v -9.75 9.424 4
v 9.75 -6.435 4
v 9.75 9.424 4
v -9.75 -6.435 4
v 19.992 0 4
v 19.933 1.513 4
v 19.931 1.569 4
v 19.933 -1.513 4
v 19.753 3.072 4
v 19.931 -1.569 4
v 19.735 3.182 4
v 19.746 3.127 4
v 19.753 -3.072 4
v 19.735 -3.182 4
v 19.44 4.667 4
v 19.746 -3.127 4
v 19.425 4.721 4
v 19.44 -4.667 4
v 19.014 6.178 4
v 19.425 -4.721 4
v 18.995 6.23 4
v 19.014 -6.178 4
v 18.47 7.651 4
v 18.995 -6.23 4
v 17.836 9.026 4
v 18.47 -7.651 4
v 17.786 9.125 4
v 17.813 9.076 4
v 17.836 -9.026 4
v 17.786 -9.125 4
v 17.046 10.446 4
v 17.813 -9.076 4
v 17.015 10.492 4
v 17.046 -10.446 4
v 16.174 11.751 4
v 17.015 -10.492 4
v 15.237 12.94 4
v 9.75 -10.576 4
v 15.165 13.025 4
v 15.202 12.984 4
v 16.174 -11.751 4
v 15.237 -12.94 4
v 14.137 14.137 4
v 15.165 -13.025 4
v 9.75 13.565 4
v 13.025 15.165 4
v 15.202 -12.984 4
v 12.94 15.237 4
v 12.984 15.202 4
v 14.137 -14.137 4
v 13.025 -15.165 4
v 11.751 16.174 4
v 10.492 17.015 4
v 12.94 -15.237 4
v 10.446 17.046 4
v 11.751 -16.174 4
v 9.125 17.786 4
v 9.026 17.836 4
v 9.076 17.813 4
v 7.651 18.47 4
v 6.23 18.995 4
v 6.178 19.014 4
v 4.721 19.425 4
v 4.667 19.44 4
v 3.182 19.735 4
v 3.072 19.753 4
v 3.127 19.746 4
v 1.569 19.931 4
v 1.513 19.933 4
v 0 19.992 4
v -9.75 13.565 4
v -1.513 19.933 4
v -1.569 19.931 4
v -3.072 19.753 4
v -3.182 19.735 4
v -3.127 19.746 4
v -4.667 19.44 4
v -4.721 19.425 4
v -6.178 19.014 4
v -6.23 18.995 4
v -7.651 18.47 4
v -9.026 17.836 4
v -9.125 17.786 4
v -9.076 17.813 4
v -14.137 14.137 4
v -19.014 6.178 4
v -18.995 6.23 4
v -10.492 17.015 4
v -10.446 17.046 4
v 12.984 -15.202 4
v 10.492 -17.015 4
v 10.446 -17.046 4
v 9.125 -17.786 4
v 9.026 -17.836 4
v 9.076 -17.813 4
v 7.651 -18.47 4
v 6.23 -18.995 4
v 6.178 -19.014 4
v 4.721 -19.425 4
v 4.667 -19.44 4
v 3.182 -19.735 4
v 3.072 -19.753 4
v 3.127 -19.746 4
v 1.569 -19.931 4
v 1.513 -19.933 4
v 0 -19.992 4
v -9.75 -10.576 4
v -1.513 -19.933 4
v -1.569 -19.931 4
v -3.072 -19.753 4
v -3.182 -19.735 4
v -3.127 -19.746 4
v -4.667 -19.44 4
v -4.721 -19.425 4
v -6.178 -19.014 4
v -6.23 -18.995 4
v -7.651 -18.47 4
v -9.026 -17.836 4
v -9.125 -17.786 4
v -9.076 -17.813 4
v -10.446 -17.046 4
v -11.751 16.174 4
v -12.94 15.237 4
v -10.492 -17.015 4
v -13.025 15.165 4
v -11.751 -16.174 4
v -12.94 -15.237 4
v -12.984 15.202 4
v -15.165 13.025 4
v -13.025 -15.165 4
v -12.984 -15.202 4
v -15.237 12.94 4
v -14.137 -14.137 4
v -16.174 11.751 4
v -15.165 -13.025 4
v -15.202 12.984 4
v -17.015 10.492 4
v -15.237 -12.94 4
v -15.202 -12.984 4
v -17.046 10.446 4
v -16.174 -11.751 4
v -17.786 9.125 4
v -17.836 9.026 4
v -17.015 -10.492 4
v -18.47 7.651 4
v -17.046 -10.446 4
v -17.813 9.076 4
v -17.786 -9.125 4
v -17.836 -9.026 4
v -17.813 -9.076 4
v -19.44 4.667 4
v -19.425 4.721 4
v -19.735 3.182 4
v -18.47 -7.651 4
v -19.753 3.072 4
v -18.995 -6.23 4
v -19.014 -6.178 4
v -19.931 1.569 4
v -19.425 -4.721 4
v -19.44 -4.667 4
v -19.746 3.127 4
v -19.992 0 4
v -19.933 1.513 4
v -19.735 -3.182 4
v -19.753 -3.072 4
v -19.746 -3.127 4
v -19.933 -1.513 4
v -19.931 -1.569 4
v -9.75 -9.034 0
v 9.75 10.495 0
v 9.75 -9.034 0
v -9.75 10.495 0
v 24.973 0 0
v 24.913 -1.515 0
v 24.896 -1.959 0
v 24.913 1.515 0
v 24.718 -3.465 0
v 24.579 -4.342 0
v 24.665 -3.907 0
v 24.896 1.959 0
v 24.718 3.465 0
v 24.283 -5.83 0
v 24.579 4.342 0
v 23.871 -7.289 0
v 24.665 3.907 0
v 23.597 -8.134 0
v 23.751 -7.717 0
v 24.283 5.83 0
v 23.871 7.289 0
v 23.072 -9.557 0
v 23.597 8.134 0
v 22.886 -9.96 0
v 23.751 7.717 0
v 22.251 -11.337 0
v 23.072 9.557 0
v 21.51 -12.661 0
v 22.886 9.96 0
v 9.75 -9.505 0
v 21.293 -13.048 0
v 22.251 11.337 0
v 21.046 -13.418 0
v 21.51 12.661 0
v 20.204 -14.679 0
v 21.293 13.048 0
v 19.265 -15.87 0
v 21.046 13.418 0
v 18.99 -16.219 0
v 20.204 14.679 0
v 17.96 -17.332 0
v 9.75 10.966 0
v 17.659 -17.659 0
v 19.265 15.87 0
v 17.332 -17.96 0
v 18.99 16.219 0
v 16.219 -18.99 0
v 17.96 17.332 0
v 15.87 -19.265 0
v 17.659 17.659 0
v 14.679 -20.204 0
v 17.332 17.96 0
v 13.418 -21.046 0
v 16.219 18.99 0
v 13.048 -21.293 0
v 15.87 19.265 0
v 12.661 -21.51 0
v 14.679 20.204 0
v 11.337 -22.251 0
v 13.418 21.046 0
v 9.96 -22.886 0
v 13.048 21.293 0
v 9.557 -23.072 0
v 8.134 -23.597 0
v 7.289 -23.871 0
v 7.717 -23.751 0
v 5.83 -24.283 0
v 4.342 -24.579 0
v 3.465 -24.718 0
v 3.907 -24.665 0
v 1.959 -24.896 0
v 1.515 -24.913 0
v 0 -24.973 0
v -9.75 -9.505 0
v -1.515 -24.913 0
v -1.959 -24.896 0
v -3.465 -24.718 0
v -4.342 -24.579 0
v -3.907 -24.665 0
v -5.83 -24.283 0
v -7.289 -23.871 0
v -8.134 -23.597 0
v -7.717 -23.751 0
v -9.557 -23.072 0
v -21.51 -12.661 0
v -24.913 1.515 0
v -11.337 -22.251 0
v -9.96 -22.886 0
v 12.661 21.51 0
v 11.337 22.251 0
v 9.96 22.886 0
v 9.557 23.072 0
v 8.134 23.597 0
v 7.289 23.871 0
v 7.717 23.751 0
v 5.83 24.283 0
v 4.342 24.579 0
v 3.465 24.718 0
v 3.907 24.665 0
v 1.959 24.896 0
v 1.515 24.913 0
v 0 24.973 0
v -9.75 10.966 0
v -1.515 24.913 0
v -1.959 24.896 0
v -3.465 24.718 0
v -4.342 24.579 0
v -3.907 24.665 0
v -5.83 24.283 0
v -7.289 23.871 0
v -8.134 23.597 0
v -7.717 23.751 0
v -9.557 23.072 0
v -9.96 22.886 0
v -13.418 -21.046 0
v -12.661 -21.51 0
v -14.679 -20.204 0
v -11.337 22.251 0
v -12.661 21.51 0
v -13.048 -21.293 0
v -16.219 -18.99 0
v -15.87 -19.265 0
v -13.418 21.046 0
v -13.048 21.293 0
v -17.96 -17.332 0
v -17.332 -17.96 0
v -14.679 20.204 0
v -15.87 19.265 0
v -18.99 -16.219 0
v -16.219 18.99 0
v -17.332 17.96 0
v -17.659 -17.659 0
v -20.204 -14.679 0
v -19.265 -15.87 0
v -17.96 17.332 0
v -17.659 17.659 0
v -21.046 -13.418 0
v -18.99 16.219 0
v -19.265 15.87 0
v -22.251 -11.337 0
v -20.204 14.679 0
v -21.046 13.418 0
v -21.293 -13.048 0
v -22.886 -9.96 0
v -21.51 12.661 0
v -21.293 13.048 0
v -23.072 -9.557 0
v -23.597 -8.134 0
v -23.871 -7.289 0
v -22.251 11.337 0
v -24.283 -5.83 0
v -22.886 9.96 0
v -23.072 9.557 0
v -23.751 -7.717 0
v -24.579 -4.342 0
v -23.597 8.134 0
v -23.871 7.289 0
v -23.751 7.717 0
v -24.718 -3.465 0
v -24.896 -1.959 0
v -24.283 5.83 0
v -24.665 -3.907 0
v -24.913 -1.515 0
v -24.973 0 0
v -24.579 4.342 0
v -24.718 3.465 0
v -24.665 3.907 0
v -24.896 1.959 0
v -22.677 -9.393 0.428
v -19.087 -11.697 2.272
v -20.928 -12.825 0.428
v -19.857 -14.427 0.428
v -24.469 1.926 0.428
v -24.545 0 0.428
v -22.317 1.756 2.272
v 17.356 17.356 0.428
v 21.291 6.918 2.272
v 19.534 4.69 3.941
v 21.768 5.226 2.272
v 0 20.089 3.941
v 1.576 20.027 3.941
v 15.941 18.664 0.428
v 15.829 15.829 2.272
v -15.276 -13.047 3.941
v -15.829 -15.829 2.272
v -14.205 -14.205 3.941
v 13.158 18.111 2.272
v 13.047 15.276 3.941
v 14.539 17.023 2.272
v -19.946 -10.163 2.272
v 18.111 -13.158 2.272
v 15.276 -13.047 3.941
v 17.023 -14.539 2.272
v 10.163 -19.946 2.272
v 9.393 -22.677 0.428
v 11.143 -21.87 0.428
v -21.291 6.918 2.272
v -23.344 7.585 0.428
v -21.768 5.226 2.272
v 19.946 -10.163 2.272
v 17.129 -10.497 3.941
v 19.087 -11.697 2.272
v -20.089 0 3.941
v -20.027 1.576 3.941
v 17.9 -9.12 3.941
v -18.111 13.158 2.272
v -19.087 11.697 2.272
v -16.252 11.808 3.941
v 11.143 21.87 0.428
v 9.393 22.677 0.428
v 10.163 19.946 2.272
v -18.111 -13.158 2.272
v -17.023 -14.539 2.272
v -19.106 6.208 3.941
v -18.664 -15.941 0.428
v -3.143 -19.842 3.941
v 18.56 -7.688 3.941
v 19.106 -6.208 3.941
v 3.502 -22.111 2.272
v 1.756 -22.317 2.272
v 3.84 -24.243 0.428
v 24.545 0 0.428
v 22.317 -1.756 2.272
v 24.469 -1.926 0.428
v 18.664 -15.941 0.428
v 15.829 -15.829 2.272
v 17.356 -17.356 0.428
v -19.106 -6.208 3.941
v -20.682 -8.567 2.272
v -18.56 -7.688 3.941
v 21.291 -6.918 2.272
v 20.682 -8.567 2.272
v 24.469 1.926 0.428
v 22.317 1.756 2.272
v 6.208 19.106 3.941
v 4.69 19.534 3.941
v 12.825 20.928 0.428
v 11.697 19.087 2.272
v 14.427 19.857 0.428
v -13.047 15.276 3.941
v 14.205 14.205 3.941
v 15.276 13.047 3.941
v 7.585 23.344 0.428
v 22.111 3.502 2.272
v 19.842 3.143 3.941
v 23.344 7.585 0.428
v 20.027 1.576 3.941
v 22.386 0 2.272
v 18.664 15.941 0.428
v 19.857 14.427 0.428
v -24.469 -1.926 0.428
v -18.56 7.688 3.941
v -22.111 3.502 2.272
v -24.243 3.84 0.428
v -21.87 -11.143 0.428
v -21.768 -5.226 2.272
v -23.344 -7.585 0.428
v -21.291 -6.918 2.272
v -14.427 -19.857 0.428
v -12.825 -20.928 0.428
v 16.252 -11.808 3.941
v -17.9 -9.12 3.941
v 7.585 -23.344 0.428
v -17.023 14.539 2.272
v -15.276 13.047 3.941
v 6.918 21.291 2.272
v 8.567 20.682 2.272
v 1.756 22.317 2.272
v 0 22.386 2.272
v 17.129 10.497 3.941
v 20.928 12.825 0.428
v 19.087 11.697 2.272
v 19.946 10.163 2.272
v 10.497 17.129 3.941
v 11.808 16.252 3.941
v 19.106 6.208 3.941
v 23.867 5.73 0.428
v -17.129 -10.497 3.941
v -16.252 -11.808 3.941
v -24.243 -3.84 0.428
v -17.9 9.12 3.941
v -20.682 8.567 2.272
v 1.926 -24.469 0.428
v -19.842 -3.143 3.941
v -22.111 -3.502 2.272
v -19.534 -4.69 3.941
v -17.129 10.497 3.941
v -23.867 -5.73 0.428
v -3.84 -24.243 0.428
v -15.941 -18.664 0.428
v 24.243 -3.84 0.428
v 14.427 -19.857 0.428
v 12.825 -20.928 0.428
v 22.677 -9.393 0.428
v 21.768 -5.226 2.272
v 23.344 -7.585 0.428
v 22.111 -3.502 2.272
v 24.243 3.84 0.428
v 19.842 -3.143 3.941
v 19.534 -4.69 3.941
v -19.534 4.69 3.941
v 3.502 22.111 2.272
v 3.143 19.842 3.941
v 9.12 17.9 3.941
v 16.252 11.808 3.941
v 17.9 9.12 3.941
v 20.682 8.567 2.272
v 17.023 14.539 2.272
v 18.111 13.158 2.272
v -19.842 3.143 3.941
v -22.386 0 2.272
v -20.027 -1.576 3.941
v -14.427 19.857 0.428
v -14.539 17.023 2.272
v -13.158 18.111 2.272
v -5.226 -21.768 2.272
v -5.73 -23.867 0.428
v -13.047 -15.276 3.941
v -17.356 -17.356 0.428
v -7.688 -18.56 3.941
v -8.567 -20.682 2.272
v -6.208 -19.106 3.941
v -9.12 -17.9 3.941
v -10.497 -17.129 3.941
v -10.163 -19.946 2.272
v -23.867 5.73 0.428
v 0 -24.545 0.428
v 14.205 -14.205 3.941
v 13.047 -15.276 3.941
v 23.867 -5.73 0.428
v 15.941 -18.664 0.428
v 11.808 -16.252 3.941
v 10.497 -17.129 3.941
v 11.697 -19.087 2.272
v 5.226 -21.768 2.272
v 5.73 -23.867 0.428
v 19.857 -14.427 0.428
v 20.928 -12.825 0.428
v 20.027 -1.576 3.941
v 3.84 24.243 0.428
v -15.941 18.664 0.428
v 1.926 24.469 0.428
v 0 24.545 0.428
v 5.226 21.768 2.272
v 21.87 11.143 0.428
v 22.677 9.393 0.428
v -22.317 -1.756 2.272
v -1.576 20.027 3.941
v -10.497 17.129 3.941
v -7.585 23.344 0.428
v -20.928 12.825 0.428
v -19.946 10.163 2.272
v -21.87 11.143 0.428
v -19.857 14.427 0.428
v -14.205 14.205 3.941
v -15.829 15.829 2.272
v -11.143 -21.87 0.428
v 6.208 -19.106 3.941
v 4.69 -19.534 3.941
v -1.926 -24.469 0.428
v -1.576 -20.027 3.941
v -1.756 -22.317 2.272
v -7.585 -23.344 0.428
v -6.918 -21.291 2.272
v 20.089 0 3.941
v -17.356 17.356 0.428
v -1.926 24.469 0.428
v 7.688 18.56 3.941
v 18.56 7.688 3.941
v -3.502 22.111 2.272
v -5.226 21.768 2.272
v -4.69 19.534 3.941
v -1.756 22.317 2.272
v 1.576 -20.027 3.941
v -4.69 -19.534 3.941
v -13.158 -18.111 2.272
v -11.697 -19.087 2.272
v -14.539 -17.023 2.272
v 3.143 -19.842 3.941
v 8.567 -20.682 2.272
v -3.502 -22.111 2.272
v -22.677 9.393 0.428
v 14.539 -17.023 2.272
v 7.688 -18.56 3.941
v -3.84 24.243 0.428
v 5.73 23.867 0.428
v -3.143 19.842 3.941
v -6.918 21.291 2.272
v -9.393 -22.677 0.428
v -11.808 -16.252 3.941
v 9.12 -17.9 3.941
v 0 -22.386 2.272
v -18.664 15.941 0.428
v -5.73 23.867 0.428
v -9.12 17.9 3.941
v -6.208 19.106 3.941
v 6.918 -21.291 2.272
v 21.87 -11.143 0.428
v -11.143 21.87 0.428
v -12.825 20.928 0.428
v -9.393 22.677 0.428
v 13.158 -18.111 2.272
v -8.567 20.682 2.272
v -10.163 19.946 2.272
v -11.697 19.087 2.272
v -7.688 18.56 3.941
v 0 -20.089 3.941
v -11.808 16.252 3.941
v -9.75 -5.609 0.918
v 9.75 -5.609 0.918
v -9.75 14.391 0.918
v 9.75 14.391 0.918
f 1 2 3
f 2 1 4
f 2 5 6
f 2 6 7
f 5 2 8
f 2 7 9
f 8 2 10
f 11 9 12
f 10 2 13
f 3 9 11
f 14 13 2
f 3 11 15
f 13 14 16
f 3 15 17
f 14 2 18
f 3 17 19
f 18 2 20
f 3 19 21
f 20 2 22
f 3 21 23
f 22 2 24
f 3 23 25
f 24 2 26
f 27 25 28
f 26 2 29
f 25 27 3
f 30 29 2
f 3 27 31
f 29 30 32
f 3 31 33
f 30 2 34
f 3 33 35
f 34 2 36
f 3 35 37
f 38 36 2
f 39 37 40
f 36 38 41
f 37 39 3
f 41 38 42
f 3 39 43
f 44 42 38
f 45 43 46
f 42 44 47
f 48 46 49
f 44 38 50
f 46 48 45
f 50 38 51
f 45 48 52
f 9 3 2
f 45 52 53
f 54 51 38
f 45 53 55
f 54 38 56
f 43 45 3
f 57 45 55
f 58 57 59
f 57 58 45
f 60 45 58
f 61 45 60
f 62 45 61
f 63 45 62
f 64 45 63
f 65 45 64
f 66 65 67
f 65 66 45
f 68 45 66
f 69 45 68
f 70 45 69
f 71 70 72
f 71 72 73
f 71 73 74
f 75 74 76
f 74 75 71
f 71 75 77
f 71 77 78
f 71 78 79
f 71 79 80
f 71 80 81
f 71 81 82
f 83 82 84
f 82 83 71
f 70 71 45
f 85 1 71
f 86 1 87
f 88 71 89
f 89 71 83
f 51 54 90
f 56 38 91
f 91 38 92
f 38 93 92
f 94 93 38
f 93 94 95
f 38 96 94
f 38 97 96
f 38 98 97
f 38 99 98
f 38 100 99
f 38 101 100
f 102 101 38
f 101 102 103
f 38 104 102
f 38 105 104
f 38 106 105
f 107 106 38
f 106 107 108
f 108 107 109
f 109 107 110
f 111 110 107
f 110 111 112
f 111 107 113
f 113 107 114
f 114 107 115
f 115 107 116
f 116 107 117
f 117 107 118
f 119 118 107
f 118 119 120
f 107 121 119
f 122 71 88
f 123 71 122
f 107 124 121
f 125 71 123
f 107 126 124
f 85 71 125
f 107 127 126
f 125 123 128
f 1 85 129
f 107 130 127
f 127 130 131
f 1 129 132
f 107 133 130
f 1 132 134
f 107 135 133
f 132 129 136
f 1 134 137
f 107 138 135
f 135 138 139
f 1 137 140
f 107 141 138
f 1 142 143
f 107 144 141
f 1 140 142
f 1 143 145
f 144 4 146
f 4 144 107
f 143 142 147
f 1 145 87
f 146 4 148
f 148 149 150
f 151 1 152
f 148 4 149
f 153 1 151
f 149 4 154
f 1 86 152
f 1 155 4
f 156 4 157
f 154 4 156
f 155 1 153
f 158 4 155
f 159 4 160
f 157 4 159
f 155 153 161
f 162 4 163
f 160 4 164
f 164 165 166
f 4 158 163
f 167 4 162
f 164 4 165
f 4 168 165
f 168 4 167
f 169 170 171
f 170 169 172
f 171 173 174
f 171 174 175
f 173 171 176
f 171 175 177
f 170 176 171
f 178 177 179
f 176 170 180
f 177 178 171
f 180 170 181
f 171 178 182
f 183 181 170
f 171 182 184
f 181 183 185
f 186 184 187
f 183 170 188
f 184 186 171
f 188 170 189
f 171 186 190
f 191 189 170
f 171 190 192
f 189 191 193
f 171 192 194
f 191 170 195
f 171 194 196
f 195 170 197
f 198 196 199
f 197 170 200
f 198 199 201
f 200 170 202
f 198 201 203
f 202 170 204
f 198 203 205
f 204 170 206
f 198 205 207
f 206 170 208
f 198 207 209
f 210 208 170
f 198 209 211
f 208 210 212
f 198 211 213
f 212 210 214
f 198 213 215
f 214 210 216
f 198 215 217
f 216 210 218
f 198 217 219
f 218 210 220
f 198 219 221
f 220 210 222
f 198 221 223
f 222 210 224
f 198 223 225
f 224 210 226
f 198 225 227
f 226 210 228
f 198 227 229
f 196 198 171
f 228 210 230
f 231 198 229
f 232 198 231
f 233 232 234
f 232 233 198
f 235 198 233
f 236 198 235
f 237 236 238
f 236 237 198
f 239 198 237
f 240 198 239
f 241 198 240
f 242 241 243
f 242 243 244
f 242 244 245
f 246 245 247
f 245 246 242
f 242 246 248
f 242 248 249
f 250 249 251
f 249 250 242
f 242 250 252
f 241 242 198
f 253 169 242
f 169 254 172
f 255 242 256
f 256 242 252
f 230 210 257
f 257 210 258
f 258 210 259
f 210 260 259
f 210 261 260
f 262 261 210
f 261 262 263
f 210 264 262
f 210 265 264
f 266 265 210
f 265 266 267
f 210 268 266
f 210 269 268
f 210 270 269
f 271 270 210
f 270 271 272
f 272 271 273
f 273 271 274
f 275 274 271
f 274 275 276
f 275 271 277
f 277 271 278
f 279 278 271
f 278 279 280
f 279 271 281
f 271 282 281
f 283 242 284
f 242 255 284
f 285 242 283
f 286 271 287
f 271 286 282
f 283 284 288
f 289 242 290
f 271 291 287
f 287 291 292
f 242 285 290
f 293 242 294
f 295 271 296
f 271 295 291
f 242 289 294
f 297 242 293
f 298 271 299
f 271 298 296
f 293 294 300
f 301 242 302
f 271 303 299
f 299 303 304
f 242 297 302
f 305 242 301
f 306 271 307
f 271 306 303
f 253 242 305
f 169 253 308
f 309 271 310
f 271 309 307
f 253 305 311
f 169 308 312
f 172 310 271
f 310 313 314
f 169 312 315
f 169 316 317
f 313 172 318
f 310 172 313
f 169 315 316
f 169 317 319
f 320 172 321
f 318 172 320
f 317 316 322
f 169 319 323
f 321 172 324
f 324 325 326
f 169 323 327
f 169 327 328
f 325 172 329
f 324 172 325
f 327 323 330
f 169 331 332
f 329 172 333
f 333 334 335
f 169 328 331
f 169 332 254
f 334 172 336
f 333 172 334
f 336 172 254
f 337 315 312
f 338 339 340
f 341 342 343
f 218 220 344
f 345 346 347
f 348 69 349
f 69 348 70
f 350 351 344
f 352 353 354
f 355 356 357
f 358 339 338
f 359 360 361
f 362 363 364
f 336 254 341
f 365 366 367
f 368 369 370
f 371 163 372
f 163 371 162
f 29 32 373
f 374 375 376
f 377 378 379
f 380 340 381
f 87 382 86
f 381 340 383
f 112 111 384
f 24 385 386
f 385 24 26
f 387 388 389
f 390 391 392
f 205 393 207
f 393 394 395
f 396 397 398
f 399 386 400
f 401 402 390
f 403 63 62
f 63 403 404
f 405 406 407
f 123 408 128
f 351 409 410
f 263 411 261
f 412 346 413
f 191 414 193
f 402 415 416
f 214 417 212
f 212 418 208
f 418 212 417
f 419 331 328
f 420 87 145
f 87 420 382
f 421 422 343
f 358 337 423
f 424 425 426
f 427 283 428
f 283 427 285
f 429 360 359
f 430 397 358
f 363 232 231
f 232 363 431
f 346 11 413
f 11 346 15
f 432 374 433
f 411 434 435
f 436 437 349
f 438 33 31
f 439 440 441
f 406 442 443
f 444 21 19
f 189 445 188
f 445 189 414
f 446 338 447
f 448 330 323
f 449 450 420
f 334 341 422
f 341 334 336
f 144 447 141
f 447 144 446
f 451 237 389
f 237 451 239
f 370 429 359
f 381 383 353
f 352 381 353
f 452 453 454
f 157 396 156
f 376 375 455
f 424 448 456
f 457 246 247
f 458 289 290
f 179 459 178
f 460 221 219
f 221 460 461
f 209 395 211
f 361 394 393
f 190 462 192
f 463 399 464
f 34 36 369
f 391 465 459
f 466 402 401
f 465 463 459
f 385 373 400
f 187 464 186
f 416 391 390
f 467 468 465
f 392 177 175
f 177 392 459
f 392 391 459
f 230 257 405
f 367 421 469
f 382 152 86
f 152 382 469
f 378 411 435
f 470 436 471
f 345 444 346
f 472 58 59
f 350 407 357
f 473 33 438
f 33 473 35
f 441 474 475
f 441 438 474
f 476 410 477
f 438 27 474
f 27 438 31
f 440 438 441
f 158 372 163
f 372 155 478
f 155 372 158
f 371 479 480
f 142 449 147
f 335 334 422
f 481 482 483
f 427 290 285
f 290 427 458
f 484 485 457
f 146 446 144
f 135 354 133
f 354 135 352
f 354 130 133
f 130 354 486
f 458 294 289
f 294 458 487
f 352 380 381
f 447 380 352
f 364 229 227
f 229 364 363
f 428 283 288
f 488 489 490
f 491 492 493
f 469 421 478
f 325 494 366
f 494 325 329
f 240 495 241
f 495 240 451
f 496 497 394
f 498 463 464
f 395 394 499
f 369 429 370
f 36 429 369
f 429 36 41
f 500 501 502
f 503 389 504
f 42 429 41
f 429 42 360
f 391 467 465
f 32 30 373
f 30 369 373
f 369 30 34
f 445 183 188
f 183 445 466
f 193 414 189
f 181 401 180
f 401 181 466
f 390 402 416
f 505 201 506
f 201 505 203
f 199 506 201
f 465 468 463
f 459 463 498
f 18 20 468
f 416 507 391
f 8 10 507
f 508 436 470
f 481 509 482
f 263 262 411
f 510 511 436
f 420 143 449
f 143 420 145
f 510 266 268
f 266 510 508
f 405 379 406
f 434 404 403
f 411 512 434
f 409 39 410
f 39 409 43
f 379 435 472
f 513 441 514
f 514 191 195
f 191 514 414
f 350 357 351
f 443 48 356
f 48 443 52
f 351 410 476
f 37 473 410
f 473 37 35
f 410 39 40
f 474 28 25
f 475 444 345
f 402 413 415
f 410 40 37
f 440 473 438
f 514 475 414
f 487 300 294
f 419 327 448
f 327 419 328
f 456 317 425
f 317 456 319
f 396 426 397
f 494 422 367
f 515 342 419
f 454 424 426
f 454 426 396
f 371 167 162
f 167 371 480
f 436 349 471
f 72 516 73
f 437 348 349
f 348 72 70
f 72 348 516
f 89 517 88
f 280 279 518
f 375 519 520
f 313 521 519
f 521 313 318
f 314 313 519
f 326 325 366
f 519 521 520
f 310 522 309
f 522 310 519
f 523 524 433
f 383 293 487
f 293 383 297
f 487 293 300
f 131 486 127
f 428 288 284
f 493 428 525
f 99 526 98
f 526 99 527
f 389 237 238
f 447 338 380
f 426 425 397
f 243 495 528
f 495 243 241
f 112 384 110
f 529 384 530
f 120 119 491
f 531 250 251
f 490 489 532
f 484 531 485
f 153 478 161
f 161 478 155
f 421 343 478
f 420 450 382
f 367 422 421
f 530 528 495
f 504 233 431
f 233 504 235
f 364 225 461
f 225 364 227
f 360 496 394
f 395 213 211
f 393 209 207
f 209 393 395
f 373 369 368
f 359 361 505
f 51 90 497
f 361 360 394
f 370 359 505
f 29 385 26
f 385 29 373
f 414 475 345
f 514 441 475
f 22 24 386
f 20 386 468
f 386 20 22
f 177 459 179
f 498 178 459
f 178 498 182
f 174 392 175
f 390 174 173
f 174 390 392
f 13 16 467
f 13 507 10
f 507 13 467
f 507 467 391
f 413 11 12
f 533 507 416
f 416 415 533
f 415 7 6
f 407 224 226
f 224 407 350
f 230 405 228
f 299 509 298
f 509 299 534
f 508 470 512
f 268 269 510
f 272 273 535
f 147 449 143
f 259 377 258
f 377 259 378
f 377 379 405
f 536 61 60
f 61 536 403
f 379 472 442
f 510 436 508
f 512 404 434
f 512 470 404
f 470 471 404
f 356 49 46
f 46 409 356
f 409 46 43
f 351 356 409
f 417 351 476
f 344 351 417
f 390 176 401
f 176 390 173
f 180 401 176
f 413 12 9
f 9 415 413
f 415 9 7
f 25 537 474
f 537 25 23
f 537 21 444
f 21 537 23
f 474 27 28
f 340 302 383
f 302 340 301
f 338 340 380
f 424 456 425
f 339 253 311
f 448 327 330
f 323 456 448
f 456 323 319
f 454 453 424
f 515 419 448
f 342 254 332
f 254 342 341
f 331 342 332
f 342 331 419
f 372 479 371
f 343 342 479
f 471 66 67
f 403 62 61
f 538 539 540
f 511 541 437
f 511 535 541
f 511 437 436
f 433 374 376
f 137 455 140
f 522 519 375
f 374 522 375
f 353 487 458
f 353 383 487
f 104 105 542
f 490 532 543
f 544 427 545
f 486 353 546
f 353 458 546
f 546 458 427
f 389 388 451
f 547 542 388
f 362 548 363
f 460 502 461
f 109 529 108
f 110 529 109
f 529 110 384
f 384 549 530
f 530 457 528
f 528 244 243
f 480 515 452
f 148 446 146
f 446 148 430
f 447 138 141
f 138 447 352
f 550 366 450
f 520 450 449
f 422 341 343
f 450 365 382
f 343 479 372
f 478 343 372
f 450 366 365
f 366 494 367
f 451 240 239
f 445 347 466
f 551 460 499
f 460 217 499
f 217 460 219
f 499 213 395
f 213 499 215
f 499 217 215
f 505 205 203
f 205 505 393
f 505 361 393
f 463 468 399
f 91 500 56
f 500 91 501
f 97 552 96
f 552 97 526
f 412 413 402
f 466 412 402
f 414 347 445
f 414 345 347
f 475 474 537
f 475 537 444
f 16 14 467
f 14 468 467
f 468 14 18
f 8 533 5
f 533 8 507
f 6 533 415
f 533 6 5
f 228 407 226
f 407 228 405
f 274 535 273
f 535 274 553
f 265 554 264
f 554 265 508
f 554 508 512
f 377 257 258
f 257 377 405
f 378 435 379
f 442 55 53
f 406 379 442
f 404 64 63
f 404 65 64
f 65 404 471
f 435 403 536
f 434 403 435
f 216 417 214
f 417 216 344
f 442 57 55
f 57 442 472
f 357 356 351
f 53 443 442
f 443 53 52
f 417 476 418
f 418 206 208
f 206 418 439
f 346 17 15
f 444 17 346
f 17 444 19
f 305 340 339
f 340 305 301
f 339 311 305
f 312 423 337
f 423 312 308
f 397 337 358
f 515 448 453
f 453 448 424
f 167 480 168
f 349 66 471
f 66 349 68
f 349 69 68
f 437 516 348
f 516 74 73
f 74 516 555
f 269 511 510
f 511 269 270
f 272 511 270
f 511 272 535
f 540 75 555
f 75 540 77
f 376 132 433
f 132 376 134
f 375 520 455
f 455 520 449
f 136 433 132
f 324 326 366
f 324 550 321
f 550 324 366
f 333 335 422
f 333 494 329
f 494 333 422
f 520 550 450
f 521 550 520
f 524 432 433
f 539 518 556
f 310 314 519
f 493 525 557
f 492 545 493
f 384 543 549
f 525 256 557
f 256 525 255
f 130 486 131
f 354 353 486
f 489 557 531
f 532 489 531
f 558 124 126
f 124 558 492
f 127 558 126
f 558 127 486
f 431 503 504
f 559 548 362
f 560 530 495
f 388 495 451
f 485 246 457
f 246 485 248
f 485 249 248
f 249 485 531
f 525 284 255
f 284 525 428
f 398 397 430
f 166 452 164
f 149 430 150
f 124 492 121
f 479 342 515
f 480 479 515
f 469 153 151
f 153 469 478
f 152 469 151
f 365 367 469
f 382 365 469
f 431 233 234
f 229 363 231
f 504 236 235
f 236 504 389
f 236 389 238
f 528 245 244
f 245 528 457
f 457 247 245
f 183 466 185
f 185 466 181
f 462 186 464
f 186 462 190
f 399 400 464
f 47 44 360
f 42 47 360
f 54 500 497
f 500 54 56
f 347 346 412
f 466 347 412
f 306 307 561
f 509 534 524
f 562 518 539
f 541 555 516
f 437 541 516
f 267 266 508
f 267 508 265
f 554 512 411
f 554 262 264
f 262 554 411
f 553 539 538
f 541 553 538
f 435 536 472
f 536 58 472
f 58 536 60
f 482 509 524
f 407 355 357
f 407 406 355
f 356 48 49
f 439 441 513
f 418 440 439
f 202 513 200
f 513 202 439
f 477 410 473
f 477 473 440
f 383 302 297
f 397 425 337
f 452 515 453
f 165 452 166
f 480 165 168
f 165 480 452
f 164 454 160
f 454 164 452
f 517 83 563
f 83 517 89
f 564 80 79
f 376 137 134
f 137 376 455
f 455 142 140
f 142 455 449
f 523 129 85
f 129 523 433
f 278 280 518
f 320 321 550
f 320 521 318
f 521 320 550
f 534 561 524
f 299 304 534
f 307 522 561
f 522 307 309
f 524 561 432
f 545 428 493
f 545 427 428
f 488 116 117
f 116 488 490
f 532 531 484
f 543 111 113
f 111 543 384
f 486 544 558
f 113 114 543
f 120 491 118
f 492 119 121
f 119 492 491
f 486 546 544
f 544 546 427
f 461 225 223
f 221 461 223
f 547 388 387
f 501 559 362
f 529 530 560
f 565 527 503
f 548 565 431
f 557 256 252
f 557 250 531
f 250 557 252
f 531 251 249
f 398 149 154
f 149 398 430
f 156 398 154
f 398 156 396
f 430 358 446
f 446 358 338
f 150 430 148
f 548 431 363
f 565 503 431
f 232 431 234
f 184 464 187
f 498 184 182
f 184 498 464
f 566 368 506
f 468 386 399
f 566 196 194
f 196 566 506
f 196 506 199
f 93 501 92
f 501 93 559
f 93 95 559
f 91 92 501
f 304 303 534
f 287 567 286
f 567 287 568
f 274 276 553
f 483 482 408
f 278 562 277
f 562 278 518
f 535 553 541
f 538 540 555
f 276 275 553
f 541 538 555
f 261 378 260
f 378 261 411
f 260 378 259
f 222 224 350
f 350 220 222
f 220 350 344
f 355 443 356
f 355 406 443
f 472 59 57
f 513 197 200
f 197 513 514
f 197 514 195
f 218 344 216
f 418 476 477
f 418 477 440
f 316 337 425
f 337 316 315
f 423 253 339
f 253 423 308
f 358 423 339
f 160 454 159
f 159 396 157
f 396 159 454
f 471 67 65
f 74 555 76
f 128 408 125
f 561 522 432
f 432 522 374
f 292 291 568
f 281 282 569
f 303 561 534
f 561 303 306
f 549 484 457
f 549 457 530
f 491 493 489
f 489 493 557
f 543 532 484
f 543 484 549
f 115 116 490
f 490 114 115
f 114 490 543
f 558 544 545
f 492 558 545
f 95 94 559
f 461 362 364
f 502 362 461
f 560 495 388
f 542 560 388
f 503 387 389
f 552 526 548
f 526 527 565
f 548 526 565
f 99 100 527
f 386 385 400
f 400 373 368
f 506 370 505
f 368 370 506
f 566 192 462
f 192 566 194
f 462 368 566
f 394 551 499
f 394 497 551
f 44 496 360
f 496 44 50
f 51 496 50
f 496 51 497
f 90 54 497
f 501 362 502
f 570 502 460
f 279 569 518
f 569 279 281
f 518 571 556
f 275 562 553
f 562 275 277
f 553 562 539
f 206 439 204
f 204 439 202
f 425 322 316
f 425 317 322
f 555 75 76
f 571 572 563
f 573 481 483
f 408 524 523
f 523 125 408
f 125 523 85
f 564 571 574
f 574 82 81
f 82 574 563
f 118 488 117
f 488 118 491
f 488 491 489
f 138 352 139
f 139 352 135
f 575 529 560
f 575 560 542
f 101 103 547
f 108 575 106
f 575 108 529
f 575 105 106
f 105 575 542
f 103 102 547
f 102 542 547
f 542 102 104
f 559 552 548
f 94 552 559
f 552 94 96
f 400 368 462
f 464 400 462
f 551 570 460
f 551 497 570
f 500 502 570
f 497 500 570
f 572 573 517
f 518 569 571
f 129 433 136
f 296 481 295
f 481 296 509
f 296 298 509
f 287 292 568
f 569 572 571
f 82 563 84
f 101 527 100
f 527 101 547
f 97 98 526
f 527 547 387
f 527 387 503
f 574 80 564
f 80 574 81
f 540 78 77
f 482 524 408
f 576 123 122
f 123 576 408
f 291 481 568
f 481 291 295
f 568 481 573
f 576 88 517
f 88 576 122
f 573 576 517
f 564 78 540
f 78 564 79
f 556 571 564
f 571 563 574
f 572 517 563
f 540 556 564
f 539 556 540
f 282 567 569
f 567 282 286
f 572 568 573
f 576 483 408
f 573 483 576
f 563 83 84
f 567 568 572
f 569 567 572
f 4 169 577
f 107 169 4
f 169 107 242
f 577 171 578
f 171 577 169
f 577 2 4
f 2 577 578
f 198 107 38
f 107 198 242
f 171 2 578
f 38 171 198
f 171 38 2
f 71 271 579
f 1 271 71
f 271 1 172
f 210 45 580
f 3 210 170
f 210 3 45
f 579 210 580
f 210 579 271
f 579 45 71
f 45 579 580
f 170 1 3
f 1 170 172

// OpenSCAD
$fn=80;

// Diameter of the base. 
base_diameter = 50; // [10:200]

// Taper ratio of the base. 0.0 means fully rounded top, 1.0 means straight up.
base_taper = 0.8; // [0.0:0.05:1.0]

// Height of the base
base_height = 4; // [1:0.5:10]

// Width of the tile.
tile_width = 19; // [4:.05:60]

// Thickness of the tile.
tile_tickness = 3.5; // [.25:.05:10]

// Clearance around the tile. Use this when you intend to wrap the tile with a piece of paper.
tile_clearance = 0.25; // [0.0:0.01:1]

// Tile placement
tile_placement = "back to back"; // [single, side by side, back to back]

// Angle at which the tile is tilted.
tile_tilt = 15; // [0:45]

// Vertial offset for tile (from bottom.)
tile_v_offset = 0.4; // [0:0.1:4]

tile_h_offset = sin(tile_tilt) * tile_width * .5;

r_bot = base_diameter / 2;
r_top = (base_diameter * base_taper) / 2;
z_offset = (r_bot * r_bot - 
            r_top * r_top - 
            base_height * base_height) / (2 * base_height);
sphere_radius = sqrt(r_bot * r_bot + z_offset * z_offset);

module tile() {
    translate([0, 0, 500])
    cube([tile_width + tile_clearance * 2, 
          tile_tickness  + tile_clearance * 2, 
          1000], center=true);
}


difference() {
    intersection() { 
        translate([0, 0, base_height/2])
        cylinder(r=r_bot, h=base_height, center=true);

        translate([0,0,-z_offset])
        sphere(r=sphere_radius);
    };
    
    translate([0, 0, tile_v_offset]) {
        if (tile_placement == "single") {
            translate([0, tile_h_offset, 0])
            rotate([tile_tilt, 0, 0]) 
            tile();
        }
        else if (tile_placement == "side by side") {
            translate([-19/2-.5, tile_h_offset, 0]) rotate([tile_tilt,0,0]) tile(19,27,3.5);
            translate([ 19/2+.5, tile_h_offset, 0]) rotate([tile_tilt,0,0]) tile(19,27,3.5);
        }
        else if (tile_placement == "back to back") {
            translate([0, -r_top/2 + tile_h_offset, 0]) rotate([tile_tilt, 0, 0]) tile(19,27,3.5);
            translate([0,  r_top/2 + tile_h_offset, 0]) rotate([tile_tilt, 0, 0]) tile(19,27,3.5);
        }
    }
}
